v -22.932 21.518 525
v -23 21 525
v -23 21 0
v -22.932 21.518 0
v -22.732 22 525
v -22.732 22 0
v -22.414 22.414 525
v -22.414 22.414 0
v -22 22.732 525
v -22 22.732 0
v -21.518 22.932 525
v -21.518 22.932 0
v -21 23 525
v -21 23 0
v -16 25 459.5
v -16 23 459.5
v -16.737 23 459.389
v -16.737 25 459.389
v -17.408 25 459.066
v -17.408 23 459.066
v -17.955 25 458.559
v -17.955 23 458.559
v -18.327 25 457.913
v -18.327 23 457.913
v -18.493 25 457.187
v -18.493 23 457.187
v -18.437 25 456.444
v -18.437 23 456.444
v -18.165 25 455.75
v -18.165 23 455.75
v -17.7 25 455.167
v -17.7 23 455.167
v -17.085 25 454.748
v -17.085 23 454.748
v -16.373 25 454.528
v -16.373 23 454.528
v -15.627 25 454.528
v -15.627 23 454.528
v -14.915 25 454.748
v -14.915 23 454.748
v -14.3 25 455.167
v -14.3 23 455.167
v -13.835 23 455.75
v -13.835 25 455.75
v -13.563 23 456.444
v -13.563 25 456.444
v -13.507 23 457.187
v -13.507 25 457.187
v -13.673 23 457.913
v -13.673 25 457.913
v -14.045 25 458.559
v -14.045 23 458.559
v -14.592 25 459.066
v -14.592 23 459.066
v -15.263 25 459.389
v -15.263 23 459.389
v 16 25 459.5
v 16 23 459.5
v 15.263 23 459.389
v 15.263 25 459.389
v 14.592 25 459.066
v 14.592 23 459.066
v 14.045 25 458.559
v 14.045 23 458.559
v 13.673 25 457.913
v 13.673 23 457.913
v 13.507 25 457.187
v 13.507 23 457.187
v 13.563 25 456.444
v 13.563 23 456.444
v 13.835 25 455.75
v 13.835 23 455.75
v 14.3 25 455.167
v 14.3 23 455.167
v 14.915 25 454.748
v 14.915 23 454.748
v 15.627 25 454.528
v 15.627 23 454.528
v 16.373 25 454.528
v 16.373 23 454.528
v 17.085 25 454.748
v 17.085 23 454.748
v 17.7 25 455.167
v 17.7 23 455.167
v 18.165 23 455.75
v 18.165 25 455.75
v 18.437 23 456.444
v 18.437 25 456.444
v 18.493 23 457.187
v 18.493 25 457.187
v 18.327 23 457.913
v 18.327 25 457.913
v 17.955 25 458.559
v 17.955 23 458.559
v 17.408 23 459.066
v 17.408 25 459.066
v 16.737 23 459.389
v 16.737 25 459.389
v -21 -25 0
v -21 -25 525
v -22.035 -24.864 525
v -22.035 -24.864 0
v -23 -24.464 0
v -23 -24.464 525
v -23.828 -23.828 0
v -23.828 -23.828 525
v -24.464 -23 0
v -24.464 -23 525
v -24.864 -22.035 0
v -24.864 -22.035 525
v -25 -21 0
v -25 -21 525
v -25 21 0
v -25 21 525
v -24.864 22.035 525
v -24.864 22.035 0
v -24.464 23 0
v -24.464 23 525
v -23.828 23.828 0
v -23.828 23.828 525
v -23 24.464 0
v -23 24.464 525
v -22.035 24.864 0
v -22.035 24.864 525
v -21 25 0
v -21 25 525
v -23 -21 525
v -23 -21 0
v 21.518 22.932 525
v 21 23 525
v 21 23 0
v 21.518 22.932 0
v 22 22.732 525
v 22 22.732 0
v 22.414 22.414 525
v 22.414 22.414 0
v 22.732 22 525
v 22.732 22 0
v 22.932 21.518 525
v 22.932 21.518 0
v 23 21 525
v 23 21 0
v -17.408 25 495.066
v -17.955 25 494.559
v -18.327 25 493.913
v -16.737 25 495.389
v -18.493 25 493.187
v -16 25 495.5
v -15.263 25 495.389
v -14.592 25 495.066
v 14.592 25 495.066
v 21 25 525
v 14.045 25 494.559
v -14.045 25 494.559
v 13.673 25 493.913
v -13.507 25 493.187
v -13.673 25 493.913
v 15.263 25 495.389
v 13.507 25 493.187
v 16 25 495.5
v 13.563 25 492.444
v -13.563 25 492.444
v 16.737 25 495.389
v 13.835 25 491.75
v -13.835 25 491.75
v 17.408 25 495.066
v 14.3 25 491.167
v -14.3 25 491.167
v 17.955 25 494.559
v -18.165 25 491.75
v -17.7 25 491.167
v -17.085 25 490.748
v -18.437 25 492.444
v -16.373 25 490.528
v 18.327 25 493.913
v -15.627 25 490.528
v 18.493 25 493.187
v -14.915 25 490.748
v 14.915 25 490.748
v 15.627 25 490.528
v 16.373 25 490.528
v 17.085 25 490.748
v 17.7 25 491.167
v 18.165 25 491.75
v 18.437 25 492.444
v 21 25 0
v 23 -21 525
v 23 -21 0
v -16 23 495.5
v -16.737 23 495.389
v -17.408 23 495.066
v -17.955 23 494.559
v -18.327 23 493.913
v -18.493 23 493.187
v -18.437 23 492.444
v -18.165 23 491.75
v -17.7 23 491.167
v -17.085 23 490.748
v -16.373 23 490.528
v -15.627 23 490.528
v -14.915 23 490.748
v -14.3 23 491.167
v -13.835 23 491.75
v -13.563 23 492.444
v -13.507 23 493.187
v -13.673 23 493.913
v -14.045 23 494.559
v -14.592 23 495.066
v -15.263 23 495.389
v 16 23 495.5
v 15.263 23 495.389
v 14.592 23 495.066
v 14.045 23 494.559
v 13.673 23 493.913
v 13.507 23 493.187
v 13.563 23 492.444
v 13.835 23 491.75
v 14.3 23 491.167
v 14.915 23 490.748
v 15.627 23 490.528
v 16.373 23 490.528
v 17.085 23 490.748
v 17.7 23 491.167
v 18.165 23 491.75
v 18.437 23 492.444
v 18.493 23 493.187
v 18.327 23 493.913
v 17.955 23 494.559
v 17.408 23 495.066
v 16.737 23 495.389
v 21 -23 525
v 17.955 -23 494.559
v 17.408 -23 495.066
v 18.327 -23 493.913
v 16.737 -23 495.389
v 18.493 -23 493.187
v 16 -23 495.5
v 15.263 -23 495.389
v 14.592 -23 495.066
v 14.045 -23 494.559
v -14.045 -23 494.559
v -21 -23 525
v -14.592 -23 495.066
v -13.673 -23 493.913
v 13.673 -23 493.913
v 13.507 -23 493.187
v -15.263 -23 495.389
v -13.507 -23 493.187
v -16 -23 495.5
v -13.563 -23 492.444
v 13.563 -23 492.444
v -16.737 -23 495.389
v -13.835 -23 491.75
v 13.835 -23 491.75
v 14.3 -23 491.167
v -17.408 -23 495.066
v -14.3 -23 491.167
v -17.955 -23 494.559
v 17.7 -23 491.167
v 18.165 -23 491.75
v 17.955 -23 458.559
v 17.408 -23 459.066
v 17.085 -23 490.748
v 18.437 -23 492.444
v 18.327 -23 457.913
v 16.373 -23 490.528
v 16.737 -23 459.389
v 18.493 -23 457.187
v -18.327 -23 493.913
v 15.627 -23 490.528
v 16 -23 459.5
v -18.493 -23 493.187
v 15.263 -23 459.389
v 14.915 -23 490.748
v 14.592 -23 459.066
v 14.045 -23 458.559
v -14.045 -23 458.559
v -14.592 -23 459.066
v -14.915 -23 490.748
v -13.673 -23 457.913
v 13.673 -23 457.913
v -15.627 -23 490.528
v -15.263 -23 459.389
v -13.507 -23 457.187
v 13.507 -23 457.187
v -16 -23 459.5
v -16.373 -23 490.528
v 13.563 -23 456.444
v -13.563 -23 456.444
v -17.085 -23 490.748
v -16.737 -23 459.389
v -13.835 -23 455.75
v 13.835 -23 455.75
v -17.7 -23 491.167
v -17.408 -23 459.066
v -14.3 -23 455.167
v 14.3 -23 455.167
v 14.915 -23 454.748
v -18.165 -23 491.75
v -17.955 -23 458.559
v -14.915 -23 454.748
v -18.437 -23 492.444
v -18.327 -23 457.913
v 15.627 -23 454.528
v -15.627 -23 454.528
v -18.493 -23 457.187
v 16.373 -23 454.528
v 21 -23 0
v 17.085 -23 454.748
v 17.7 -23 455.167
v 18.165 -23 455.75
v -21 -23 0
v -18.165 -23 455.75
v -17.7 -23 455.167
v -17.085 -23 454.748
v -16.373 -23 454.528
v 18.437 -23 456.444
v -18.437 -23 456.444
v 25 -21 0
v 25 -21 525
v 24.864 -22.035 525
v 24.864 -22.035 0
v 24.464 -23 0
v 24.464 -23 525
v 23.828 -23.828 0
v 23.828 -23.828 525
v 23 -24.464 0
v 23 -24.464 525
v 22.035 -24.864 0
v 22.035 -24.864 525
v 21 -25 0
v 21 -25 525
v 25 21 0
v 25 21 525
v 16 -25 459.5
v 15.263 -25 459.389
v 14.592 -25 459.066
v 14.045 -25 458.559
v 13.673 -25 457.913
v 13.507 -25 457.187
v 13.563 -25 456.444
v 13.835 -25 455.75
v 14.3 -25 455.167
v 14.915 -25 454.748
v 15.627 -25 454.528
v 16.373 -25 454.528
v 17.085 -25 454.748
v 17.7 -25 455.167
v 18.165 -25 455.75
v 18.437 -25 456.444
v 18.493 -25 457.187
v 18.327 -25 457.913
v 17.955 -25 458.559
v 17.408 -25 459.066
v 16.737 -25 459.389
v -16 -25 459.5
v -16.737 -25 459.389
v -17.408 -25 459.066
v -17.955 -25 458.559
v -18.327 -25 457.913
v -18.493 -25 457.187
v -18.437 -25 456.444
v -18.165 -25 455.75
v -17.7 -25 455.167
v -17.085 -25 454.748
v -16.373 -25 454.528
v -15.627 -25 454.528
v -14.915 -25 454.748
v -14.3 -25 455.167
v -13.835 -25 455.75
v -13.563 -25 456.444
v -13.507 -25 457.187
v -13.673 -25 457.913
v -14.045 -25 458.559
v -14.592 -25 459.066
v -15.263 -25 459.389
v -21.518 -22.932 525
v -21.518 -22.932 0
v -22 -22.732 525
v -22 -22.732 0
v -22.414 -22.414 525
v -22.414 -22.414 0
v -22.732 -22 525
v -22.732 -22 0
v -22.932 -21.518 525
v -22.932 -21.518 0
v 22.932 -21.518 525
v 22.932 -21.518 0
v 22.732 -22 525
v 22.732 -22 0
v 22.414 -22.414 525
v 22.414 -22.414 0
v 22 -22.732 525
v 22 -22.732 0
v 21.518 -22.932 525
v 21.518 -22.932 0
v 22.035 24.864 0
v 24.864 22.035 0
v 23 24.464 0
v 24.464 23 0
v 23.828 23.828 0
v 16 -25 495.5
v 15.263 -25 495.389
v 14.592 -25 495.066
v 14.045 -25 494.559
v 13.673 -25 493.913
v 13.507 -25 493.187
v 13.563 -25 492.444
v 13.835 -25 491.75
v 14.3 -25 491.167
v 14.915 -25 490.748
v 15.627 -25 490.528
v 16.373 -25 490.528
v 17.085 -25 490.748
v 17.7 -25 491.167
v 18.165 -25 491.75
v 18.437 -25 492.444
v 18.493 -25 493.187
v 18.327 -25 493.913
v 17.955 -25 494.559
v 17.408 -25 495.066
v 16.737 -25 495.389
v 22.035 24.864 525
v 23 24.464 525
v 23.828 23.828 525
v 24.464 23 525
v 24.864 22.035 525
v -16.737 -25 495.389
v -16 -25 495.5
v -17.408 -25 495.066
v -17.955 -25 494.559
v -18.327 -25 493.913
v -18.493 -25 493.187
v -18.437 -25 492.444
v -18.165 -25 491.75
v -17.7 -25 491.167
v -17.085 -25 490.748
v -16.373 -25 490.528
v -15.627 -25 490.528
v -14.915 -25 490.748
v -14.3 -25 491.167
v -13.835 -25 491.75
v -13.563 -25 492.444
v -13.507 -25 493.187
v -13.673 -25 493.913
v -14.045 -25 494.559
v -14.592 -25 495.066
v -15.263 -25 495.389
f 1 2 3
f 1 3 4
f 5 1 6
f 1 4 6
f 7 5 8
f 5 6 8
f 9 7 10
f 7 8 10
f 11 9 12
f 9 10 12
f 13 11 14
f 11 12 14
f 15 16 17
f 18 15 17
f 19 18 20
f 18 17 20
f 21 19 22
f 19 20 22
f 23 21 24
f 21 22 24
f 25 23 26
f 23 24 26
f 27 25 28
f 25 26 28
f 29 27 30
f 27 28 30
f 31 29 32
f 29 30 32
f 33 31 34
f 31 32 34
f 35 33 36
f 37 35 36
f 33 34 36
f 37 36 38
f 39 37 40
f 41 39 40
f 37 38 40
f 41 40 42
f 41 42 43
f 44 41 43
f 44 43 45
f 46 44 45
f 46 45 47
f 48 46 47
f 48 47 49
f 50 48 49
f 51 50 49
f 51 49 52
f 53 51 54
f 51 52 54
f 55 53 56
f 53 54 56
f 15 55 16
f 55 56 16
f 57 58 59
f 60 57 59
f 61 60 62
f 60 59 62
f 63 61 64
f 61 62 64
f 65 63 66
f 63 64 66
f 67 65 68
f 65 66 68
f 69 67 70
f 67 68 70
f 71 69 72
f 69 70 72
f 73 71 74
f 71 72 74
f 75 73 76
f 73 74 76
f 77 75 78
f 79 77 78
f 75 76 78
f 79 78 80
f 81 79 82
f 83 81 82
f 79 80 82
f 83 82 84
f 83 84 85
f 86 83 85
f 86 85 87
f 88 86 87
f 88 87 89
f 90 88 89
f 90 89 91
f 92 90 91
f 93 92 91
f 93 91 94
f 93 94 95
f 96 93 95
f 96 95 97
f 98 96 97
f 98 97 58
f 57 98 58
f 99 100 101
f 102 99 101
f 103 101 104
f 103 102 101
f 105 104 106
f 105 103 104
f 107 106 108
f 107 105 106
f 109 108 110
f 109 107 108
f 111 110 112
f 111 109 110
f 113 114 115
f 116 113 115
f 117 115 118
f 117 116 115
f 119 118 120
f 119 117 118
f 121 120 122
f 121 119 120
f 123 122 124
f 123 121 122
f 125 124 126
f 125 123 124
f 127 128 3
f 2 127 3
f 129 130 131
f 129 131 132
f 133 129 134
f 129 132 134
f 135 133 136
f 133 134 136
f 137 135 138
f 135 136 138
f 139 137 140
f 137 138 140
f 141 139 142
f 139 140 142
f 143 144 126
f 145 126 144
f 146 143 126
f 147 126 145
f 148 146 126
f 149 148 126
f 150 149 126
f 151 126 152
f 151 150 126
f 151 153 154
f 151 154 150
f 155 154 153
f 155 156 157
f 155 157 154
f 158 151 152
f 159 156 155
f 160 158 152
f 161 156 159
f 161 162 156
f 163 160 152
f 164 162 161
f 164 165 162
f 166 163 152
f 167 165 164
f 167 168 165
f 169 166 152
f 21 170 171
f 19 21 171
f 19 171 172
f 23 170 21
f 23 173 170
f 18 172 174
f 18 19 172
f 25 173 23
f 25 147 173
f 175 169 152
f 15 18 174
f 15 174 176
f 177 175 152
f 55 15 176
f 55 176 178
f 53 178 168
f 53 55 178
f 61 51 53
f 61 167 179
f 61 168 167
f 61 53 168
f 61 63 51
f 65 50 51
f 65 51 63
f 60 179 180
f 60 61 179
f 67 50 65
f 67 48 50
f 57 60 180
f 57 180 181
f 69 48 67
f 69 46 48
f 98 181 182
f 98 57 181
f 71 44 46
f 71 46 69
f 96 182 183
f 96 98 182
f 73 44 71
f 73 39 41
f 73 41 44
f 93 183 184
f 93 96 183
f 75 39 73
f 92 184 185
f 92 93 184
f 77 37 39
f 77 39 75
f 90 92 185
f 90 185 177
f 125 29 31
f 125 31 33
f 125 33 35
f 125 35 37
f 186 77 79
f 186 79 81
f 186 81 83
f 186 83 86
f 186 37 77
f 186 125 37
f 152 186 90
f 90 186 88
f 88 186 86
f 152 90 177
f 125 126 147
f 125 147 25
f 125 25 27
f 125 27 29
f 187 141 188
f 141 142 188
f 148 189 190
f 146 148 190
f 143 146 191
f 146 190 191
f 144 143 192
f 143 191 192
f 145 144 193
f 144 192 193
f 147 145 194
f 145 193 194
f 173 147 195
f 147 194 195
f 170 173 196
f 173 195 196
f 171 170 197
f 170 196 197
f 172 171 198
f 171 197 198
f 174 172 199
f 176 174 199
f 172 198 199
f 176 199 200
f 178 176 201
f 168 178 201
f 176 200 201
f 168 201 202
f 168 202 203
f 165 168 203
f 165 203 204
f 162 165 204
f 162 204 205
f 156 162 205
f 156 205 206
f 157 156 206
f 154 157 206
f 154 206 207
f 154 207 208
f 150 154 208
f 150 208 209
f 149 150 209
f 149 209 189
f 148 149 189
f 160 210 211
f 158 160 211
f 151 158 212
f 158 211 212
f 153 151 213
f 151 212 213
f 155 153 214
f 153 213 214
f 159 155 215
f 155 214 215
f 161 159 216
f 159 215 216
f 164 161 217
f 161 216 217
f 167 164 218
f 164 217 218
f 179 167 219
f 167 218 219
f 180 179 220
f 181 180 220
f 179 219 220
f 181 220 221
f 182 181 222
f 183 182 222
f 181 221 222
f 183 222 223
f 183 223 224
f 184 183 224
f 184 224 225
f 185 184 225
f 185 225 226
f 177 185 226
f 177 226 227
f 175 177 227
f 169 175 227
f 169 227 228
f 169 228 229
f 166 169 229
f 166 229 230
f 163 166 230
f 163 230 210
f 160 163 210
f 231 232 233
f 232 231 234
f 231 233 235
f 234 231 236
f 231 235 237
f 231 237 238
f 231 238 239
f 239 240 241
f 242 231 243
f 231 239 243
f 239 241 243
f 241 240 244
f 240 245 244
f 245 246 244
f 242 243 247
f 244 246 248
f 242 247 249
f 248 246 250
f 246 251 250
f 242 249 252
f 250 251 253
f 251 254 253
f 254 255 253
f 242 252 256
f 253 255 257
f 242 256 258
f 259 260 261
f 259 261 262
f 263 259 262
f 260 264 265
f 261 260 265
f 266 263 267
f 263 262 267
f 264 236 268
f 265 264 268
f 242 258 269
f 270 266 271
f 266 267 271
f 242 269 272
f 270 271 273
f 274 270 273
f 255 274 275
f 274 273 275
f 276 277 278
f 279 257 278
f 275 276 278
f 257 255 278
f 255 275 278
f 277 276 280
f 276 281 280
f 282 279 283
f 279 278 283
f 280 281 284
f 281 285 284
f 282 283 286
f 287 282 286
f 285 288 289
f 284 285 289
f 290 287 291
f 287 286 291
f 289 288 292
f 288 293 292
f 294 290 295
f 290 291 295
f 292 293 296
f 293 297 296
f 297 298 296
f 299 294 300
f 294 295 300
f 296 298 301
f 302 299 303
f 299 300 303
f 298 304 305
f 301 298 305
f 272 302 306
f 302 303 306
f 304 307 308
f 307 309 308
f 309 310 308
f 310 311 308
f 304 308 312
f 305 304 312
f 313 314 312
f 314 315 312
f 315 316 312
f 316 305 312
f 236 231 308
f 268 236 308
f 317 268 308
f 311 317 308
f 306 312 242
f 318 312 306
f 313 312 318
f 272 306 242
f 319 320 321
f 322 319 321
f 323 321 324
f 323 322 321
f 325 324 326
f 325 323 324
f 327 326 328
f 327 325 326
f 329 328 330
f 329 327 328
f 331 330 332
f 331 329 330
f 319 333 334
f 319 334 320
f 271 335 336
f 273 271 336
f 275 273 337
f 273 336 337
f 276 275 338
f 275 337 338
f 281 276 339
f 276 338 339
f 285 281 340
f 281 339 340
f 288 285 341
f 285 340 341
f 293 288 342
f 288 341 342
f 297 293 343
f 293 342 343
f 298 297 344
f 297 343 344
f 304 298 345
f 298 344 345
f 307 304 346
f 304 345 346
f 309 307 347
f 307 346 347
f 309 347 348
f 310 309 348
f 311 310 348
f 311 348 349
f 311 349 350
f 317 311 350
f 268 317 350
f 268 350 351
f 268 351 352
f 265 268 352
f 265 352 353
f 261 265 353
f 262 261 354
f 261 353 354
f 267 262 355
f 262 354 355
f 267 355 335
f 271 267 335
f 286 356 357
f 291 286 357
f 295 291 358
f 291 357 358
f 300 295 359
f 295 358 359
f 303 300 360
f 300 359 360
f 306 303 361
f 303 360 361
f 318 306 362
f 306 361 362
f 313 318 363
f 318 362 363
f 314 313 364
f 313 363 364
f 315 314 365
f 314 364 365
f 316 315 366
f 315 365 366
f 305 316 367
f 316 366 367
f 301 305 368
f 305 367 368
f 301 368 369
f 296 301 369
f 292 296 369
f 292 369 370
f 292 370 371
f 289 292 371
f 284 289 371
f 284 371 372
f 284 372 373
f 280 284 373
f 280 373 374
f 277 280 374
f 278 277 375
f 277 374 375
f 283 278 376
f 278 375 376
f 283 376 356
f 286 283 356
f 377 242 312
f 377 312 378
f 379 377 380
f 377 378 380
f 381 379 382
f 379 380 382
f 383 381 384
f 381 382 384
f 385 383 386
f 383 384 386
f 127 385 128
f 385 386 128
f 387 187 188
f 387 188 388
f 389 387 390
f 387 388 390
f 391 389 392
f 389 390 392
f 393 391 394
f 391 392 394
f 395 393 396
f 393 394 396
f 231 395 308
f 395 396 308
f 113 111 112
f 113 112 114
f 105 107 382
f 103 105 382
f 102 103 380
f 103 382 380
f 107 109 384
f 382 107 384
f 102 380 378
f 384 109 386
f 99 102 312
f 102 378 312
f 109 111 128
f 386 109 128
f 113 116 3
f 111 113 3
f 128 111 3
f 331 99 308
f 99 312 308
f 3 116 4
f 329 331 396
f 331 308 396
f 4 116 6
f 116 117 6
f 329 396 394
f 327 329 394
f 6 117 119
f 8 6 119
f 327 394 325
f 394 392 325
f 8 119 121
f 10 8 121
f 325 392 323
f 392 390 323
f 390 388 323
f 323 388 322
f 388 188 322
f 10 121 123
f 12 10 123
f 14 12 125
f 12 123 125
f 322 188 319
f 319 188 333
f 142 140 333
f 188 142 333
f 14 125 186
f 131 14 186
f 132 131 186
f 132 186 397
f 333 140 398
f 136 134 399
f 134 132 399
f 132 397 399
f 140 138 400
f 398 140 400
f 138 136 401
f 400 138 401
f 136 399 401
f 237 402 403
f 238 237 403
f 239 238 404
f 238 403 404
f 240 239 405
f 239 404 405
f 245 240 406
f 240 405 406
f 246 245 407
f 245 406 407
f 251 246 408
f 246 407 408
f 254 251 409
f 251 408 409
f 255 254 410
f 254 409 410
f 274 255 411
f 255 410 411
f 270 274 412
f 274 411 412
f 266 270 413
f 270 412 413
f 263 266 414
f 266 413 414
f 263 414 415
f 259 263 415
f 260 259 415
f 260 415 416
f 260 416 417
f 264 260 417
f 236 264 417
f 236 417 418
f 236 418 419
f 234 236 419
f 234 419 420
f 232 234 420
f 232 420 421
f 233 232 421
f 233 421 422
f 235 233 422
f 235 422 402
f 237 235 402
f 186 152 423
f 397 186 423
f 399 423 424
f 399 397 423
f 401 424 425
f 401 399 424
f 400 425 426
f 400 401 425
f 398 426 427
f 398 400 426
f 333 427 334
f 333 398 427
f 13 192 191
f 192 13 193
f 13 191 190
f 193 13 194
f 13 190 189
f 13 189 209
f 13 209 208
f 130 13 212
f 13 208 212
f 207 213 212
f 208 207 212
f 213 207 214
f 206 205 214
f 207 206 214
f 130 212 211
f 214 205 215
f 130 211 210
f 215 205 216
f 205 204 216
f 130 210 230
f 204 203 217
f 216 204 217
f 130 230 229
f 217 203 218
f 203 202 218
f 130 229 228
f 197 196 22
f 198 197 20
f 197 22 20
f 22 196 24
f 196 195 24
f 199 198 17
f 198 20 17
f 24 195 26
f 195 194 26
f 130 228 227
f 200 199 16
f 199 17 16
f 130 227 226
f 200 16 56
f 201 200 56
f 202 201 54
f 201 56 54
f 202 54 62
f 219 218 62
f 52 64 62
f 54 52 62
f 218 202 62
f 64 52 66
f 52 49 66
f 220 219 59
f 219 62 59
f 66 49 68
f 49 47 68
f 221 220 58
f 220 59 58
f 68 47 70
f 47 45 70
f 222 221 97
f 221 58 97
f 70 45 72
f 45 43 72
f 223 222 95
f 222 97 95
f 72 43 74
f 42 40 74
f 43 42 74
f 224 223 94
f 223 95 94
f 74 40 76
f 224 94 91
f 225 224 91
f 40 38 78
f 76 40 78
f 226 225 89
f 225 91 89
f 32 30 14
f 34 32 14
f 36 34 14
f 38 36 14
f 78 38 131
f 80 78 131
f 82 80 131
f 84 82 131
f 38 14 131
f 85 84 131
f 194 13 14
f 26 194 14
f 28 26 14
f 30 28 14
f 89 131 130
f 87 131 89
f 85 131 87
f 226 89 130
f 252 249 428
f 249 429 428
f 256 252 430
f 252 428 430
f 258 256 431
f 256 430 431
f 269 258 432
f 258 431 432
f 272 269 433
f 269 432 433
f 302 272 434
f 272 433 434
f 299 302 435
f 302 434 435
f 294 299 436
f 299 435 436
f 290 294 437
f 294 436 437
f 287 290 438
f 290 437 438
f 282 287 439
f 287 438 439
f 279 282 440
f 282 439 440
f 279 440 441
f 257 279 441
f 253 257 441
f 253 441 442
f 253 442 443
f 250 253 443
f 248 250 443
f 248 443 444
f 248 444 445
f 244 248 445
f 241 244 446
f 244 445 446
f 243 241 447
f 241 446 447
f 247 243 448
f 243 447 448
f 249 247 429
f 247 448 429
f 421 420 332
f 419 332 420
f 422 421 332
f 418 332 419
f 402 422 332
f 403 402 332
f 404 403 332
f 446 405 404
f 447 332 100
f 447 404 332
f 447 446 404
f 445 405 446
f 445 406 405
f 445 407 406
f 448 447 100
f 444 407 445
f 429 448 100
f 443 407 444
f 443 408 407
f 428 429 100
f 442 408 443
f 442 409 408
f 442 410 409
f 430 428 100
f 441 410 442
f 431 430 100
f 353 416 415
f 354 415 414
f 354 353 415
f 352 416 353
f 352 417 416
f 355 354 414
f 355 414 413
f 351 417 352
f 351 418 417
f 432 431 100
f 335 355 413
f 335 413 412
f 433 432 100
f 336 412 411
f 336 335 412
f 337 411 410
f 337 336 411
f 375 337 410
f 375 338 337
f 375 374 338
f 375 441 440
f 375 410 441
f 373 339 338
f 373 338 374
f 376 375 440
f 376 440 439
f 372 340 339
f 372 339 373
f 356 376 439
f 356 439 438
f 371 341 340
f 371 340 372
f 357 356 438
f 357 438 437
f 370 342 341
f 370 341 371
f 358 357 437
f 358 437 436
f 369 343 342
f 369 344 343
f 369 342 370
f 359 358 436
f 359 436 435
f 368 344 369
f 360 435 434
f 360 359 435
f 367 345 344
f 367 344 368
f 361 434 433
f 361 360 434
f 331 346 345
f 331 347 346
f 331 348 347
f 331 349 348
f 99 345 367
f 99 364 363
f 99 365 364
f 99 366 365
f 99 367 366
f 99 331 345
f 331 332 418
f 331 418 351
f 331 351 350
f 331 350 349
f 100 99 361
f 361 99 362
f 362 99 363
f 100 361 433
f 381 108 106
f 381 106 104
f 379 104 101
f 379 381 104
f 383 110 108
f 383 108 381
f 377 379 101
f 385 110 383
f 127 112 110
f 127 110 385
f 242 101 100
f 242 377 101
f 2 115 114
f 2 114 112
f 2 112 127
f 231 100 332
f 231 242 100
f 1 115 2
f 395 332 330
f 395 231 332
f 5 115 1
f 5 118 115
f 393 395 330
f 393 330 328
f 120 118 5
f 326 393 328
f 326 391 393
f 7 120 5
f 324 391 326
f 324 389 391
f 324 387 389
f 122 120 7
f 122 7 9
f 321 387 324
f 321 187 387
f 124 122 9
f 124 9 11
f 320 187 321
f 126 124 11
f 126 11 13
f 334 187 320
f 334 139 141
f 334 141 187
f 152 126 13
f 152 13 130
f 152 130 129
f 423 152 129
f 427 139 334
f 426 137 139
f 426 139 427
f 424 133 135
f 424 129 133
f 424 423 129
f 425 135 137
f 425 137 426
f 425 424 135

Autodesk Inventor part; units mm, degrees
ref_plane "Start Plane" through (0, 0, 0) normal (0, 0, 1) x (1, 0, 0)
ref_plane "End Plane" through (0, 0, 525) normal (0, 0, 1) x (1, 0, 0)
sketch "Sketch" plane through (0, 0, 0) normal (0, 0, 1) x (1, 0, 0)
  line L0 (-25, -21) -> (-25, 21)
  line L1 (-21, 25) -> (21, 25)
  line L2 (25, 21) -> (25, -21)
  line L3 (21, -25) -> (-21, -25)
  arc A0 (-25, -21) -> (-21, -25) centre (-21, -21) ccw
  arc A1 (25, 21) -> (21, 25) centre (21, 21) ccw
  arc A2 (-21, 25) -> (-25, 21) centre (-21, 21) ccw
  arc A3 (21, -25) -> (25, -21) centre (21, -21) ccw
  arc A4 (-21, 23) -> (-23, 21) centre (-21, 21) ccw
  line L4 (-21, 23) -> (21, 23)
  arc A5 (23, 21) -> (21, 23) centre (21, 21) ccw
  line L5 (23, 21) -> (23, -21)
  arc A6 (21, -23) -> (23, -21) centre (21, -21) ccw
  line L6 (21, -23) -> (-21, -23)
  arc A7 (-23, -21) -> (-21, -23) centre (-21, -21) ccw
  line L7 (-23, -21) -> (-23, 21)
  line L8 (0, 36.1598) -> (0, -36.1598) construction
  line L9 (-36.1598, 0) -> (36.1598, 0) construction
  dimension "d7" = 4
  dimension "d9" = 50
  dimension "d11" = 50
  dimension "d12" = 2
  dimension "d15" = 25
  dimension "d16" = 25
extrude "Body" add sketch "Sketch" along normal up to surface (525 mm away) from surface at 0
sketch "Sketch3" plane through (0, 0, 0) normal (0, 0, 1) x (1, 0, 0)
  line L0 (0, 0) -> (10, 0)
ref_plane "Work Plane3" through (0, 0, 0) normal (0, -1, 0) x (1, 0, 0)
sketch "Sketch4" plane through (0, 0, 0) normal (0, -1, 0) x (1, 0, 0)
  line L0 (-2, 0) -> (12, 0)
  line L1 (-2, 525) -> (12, 525)
  dimension "d18" = 525
ref_plane "Work Plane4" through (0, -20, 525) normal (0, 0, 1) x (1, 0, 0)
split "Split1" plane through (0, -20, 525) removes the side toward (0, 0, 1)
sketch "Sketch5" plane through (21, 25, 525) normal (0, 1, 0) x (1, 0, 0)
  line L0 (-42, 0) -> (0, 0) projected
  line L1 (0, 525) -> (0, 0) projected
  line L2 (-42, 525) -> (0, 525) projected
  line L3 (-42, 525) -> (-42, 0) projected
  line L4 (-42, 0) -> (0, 0) projected
  line L5 (-21, 0) -> (-21, 21.8701)
  line L6 (-37, 32) -> (-5, 32)
  line L7 (-5, 32) -> (-5, 68)
  line L8 (-5, 68) -> (-37, 68)
  line L9 (-37, 68) -> (-37, 32)
  point P0 (-21, 525)
  dimension "d19" = 32
  dimension "d20" = 36
  dimension "d21" = 32
hole "Hole1" at (-16, 25, 457) at (-16, 25, 493) at (16, 25, 493) at (16, 25, 457) direction (0, -1, 0) diameter 5 depth 50
equation "\"d7\" = G_IR"
equation "\"d9\" = G_W"
equation "\"d11\" = G_H"
equation "\"d12\" = G_T"
equation "\"d15\" = 0.5 * d9"
equation "\"d16\" = 0.5 * d11"
equation "\"d3\" = G_L"
equation "\"G_W\" = 50"
equation "\"G_H\" = 50"
equation "\"G_T\" = 2"
equation "\"G_IR\" = 4"
equation "\"G_L\" = d18"
equation "\"G_OFFSET_START\" = 0"
equation "\"G_OFFSET_END\" = -25"
equation "\"d14\" = G_OFFSET_END + B_L"
equation "\"B_L\" = 550"
properties part number "ISO 10799-2 - 50x50x2 - 525" material "Steel, Galvanized"
